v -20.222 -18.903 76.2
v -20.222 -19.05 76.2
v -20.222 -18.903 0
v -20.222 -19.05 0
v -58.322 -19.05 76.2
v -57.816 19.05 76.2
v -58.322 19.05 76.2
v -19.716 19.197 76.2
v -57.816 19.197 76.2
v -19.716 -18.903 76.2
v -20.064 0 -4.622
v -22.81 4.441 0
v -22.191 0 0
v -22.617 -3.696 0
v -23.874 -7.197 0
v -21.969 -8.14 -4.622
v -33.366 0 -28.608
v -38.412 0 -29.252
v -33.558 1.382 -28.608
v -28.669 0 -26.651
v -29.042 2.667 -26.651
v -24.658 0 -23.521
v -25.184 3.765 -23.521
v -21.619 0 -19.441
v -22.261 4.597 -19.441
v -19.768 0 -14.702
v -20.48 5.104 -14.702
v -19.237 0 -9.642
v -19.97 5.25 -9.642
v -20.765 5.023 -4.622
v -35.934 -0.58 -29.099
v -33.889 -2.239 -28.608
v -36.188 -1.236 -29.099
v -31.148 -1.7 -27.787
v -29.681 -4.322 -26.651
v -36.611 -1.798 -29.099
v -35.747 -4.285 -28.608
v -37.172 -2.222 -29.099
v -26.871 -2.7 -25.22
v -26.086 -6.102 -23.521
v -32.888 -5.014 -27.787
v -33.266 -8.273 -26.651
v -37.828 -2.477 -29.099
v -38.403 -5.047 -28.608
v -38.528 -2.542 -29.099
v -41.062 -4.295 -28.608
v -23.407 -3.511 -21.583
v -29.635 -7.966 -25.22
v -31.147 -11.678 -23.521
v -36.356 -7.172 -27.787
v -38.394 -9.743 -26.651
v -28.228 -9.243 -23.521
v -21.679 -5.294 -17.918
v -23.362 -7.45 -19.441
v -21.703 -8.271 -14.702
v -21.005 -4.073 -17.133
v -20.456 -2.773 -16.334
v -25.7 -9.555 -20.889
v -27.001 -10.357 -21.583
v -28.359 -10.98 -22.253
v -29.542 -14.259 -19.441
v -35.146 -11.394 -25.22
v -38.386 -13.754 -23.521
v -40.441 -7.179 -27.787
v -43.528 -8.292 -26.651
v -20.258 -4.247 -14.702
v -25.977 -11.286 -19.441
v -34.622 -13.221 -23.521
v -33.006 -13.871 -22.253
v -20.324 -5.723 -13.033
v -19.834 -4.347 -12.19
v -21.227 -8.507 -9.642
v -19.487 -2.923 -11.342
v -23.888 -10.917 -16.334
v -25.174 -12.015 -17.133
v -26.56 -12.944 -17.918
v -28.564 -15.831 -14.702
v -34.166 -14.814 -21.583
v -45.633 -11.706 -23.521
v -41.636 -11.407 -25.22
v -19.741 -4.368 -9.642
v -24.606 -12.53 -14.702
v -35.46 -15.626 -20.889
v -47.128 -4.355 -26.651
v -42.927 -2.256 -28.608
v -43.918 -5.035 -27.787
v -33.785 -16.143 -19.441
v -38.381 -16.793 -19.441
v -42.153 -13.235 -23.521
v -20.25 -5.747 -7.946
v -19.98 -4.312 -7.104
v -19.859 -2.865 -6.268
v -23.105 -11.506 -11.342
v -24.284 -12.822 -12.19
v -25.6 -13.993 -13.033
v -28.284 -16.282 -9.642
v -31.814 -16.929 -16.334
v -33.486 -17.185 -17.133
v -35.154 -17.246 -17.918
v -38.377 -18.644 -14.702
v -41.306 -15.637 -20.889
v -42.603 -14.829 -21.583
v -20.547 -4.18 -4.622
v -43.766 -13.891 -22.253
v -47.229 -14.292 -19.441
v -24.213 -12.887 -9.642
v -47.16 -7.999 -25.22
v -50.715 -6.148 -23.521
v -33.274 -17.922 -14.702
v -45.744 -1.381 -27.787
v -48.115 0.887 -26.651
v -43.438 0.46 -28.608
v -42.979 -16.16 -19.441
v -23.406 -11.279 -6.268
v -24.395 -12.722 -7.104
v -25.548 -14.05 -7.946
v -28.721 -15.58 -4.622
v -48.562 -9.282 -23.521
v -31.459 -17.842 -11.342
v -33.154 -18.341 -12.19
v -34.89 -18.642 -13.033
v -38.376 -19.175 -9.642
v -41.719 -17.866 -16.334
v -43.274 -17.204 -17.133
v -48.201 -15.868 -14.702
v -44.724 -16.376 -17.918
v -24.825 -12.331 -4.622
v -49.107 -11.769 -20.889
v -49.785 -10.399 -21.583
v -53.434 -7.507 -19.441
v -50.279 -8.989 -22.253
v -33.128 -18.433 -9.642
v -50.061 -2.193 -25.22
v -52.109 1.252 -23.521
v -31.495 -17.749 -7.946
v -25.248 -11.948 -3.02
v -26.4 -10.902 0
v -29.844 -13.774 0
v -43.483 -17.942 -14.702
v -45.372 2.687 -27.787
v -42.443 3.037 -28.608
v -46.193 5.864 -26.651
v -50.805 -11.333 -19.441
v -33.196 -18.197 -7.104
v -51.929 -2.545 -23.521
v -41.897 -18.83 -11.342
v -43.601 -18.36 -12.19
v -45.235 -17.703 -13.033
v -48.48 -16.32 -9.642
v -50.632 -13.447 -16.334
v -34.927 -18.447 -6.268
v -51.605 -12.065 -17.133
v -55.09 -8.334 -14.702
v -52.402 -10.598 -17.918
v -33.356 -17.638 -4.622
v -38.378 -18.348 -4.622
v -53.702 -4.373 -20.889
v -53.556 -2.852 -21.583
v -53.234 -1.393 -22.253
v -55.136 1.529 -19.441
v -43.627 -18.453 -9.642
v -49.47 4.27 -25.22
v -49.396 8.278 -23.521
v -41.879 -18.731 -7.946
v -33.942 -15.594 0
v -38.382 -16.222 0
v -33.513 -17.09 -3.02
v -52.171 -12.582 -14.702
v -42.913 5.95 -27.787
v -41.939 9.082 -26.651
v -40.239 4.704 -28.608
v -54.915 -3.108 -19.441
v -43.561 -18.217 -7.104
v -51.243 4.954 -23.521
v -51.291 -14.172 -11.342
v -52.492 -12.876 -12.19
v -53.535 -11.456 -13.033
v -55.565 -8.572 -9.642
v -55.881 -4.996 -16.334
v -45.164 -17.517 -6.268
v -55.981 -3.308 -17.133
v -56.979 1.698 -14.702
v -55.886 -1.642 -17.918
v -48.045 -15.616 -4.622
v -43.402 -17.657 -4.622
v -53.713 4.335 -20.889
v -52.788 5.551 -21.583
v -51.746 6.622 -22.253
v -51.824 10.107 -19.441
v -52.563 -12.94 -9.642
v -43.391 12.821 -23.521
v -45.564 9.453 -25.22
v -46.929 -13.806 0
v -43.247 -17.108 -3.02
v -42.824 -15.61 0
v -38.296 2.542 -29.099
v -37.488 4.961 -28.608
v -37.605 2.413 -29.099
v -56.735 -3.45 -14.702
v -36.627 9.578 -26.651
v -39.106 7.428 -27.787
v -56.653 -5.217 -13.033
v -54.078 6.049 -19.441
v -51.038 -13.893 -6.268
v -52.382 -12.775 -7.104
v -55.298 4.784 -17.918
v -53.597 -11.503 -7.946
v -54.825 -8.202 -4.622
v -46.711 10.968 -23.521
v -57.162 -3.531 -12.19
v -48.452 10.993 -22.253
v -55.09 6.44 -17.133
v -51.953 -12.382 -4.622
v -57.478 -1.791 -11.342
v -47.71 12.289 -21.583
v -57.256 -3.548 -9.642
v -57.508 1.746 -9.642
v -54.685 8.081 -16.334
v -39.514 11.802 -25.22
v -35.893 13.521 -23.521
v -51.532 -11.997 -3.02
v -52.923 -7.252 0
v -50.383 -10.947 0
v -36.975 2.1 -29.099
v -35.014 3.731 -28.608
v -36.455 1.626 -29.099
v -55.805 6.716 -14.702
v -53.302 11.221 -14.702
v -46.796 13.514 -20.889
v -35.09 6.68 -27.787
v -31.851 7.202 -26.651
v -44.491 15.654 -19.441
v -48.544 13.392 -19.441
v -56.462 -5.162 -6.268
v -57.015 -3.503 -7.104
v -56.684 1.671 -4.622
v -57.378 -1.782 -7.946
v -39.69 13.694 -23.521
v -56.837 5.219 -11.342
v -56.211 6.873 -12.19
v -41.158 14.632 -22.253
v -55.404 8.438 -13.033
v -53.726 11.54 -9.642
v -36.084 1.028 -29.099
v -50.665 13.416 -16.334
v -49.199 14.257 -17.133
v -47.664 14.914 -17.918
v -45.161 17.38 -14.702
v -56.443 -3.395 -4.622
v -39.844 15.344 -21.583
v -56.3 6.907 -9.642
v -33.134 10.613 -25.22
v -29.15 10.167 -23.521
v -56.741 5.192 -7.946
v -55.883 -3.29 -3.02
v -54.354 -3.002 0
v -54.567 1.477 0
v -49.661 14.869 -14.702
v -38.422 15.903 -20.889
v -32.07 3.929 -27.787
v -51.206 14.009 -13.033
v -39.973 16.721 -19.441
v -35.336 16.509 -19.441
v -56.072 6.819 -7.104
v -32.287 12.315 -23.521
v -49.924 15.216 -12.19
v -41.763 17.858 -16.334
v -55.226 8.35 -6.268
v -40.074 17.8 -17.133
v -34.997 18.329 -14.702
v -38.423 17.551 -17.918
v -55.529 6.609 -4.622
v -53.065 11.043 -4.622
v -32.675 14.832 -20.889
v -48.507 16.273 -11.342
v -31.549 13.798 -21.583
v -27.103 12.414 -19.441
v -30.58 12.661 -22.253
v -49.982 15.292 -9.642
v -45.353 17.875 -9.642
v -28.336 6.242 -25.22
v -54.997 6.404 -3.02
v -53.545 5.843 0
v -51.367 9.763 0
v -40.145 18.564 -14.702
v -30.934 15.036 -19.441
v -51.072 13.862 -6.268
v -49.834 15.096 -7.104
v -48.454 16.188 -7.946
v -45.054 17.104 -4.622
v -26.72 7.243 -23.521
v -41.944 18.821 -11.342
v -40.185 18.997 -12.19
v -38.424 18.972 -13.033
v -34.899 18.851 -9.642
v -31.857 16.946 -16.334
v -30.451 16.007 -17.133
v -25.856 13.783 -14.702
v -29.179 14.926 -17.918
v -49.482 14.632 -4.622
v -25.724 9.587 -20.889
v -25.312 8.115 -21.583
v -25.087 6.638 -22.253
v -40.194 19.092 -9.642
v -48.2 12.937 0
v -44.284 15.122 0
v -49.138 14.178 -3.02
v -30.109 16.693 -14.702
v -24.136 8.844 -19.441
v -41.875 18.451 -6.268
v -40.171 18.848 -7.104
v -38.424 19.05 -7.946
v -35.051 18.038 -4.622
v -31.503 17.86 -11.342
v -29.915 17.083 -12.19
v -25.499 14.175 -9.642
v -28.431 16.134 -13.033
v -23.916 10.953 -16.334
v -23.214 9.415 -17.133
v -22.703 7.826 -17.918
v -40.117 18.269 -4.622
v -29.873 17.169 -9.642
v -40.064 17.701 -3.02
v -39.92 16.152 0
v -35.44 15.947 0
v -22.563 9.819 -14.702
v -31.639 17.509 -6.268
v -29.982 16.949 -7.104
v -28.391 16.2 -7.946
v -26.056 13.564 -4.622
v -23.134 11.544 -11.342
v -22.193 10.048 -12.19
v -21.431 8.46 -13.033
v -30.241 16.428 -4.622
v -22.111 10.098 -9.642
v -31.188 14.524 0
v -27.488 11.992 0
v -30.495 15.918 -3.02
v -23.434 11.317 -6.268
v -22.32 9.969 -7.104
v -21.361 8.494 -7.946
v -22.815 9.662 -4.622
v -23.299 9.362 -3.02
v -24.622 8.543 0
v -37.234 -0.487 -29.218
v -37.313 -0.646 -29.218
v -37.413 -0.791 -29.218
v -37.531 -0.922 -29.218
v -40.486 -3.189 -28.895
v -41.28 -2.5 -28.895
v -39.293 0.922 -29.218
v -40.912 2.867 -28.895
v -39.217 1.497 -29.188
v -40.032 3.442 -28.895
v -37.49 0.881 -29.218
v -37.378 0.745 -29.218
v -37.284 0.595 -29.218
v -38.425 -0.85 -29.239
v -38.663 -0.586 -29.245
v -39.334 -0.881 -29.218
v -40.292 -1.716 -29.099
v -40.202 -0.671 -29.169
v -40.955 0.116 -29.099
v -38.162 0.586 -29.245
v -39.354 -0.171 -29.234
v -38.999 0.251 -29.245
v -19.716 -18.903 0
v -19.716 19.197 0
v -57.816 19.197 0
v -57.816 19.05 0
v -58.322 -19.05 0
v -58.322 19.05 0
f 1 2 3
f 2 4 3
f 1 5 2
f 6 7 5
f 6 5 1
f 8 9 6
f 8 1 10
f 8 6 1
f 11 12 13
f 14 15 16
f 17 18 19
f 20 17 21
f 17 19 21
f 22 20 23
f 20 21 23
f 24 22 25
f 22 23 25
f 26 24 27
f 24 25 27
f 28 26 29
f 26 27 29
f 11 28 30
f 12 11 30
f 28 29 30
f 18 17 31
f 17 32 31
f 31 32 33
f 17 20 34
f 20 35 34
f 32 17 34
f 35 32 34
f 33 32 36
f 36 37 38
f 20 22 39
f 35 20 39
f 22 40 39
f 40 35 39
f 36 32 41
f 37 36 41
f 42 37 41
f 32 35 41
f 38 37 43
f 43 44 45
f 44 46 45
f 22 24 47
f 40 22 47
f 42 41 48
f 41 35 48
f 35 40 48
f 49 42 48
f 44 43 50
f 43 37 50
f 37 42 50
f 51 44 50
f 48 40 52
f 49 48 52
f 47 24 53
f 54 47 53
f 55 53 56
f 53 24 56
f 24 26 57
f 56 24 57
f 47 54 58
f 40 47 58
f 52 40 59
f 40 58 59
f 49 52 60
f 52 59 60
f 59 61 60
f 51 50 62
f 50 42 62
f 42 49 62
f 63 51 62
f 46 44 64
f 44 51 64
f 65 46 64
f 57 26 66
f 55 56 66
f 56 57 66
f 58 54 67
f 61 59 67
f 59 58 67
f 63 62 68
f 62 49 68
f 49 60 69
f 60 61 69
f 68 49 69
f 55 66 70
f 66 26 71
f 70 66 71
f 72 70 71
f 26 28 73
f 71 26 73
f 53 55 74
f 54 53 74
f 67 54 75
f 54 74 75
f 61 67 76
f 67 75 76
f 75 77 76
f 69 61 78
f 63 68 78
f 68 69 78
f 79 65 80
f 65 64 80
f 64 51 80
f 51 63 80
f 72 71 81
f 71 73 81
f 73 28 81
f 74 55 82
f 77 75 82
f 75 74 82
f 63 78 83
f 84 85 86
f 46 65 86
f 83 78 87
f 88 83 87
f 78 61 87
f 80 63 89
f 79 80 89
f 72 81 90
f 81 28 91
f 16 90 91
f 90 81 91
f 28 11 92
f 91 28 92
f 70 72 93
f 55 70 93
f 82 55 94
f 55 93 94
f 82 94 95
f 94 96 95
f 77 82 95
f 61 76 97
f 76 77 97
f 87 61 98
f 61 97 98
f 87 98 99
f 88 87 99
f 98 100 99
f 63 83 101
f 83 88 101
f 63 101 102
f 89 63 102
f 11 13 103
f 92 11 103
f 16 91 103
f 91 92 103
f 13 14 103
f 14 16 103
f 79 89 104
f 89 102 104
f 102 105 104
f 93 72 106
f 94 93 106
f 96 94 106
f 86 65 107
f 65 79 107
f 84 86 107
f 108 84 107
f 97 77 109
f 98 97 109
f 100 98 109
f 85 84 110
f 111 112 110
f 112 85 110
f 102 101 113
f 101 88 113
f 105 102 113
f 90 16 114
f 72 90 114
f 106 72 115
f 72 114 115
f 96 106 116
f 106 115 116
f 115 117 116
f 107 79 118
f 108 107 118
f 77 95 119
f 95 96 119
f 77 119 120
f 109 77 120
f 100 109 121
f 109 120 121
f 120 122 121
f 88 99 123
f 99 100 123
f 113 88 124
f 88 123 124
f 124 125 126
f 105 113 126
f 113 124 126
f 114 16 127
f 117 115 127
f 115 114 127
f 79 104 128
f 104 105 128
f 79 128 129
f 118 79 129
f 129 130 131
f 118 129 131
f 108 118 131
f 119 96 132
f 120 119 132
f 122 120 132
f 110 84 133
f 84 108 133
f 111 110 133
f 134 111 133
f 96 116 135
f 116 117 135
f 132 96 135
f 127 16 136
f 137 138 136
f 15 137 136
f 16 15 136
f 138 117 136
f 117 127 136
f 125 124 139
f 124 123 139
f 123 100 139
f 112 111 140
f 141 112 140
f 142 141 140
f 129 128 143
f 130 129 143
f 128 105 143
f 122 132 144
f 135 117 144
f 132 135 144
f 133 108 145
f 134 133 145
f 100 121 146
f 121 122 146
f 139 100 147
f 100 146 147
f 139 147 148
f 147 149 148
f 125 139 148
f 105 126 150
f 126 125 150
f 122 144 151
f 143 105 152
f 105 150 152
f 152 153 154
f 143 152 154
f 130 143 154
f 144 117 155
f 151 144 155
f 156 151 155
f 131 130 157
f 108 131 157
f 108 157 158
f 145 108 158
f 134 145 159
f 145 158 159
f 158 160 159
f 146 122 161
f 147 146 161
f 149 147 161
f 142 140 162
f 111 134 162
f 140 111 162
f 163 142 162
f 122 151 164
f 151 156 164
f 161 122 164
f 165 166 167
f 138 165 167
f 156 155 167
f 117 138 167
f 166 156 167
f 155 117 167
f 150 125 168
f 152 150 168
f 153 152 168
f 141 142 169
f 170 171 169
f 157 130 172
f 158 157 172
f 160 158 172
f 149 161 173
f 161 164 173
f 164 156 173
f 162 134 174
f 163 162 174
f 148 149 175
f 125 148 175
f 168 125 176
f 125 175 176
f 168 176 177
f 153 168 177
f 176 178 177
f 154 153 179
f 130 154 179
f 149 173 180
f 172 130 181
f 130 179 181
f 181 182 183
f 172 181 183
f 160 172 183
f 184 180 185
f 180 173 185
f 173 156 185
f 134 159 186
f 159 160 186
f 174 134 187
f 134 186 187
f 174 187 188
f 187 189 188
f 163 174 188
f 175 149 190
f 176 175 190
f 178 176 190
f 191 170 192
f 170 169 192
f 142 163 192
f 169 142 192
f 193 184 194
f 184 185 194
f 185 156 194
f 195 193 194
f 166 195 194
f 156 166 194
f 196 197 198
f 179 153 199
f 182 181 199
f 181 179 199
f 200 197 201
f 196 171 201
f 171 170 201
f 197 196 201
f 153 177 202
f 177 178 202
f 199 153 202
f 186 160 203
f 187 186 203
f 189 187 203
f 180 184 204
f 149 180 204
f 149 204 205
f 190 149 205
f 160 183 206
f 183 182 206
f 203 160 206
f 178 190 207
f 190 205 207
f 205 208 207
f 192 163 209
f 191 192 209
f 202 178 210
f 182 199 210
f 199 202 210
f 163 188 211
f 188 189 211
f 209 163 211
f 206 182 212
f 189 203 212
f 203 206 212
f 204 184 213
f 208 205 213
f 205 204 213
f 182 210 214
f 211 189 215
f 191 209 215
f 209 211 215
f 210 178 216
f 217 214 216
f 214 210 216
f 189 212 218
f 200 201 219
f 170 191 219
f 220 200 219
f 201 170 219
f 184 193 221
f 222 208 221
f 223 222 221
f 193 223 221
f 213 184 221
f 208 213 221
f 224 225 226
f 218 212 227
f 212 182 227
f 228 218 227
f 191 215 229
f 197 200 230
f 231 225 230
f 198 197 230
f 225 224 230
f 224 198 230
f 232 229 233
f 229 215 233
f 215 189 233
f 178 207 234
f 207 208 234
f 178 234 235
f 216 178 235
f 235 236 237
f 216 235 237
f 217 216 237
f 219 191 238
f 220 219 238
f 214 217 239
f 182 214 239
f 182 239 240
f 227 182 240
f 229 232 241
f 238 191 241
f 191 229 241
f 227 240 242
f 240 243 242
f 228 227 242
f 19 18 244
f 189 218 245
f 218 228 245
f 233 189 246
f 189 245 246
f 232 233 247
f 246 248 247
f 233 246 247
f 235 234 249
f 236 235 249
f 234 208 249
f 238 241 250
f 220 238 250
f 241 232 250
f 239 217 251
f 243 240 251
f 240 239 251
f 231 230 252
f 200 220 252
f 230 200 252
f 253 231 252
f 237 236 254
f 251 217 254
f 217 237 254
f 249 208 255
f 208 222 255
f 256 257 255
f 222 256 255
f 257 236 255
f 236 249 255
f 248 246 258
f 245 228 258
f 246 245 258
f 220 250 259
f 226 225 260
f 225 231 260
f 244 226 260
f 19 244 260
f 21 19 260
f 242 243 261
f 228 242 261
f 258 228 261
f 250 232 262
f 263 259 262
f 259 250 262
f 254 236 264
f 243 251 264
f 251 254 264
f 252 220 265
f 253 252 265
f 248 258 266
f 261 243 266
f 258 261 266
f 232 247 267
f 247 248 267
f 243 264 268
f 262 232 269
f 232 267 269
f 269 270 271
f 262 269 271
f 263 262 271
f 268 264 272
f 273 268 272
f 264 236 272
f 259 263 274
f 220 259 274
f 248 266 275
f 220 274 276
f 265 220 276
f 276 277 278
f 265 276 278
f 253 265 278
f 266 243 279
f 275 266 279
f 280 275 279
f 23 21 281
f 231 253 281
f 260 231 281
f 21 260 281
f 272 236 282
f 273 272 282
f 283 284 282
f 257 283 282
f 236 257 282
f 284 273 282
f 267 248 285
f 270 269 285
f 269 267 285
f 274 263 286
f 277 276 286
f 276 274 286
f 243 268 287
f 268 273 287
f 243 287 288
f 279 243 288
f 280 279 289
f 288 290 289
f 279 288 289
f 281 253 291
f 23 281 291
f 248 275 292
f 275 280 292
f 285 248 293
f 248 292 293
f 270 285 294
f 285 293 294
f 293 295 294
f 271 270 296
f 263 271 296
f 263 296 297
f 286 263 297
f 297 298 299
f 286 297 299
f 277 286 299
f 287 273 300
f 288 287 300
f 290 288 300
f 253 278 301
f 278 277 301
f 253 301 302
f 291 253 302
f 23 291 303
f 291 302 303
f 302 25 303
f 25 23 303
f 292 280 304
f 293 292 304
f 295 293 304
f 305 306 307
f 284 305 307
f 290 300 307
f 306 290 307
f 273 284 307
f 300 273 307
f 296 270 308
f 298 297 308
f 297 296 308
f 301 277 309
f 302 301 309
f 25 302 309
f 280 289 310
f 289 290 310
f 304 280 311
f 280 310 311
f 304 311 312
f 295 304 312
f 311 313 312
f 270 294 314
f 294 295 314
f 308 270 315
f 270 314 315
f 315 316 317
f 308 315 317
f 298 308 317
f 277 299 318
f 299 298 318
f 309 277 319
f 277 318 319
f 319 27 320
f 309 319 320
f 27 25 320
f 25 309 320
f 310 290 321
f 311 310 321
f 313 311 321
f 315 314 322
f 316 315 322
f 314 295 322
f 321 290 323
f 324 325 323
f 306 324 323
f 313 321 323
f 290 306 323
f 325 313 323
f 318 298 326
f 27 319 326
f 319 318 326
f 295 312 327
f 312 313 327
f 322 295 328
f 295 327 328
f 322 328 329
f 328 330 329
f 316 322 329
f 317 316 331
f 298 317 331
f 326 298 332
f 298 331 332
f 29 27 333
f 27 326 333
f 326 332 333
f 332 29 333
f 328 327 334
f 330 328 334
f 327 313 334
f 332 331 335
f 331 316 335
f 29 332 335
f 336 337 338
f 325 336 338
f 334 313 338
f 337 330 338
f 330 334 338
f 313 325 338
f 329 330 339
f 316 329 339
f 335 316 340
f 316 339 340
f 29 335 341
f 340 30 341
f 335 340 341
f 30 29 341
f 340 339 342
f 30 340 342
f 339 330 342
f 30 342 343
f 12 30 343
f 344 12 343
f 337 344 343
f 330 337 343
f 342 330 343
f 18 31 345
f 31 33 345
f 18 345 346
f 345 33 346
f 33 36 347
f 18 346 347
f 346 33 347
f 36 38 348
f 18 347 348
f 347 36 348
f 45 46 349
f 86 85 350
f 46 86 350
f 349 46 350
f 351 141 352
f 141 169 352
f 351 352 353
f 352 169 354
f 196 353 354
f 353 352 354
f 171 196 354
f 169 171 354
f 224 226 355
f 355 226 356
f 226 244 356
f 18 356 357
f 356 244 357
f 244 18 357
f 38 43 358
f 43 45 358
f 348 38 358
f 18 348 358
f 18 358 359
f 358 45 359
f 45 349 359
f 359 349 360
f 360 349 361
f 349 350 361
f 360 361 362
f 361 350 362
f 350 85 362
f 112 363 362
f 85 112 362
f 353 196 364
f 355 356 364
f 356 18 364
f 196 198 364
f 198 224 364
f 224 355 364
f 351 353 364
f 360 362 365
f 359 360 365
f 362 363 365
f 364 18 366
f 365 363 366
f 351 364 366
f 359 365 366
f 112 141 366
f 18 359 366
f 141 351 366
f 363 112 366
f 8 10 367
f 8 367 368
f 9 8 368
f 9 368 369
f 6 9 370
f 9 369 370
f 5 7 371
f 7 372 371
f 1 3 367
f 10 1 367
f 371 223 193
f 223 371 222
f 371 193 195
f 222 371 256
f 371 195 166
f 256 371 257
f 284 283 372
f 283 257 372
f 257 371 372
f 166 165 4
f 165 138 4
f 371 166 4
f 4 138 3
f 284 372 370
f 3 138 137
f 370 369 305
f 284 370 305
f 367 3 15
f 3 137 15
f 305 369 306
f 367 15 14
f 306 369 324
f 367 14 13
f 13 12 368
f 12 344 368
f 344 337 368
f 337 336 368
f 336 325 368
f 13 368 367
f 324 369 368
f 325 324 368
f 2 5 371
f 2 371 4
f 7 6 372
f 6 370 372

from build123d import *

# Parameters (mm, degrees)
F2_W     = 38.1
F2_H     = 38.1
F3_DEPTH = 38.1
F4_W     = 38.1
F4_H     = 38.1
F5_DEPTH = 38.1
F6_DEPTH = 38.1


with BuildPart() as f1:
    # F0 (on Front) → F1 (revolve)
    with BuildSketch(Plane.XZ):
        with BuildLine():
            ThreePointArc((-38.412295, -29.251639), (-19.228771, -10.201639), (-38.412295, 8.848361))
            Line((-38.412295, 8.848361), (-38.412295, -29.251639))
        make_face()
    revolve(axis=Axis((-38.412295, 0, -10.201639), (0, 0, -1)))

    # F2 (on Top) → F3 (join)
    with BuildSketch(Plane.XY):
        with Locations((-39.272306, 0)):
            Rectangle(F2_W, F2_H)
    extrude(amount=F3_DEPTH)

    # F4 (on Top) → F5 (join)
    with BuildSketch(Plane.XY):
        with Locations((-38.76623, 0.147158)):
            Rectangle(F4_W, F4_H)
    extrude(amount=F5_DEPTH)

    # F5_face (on face) → F6 (join)
    with BuildSketch(Plane(origin=(-39.019268, 0.073579, 38.1), x_dir=(1, 0, 0), z_dir=(0, 0, 1))):
        Polygon((19.303038, 19.123579), (-18.796962, 19.123579), (-18.796962, 18.976421), (-19.303038, 18.976421), (-19.303038, -19.123579), (18.796962, -19.123579), (18.796962, -18.976421), (19.303038, -18.976421), align=None)
    extrude(amount=F6_DEPTH)


solid = f1.part
